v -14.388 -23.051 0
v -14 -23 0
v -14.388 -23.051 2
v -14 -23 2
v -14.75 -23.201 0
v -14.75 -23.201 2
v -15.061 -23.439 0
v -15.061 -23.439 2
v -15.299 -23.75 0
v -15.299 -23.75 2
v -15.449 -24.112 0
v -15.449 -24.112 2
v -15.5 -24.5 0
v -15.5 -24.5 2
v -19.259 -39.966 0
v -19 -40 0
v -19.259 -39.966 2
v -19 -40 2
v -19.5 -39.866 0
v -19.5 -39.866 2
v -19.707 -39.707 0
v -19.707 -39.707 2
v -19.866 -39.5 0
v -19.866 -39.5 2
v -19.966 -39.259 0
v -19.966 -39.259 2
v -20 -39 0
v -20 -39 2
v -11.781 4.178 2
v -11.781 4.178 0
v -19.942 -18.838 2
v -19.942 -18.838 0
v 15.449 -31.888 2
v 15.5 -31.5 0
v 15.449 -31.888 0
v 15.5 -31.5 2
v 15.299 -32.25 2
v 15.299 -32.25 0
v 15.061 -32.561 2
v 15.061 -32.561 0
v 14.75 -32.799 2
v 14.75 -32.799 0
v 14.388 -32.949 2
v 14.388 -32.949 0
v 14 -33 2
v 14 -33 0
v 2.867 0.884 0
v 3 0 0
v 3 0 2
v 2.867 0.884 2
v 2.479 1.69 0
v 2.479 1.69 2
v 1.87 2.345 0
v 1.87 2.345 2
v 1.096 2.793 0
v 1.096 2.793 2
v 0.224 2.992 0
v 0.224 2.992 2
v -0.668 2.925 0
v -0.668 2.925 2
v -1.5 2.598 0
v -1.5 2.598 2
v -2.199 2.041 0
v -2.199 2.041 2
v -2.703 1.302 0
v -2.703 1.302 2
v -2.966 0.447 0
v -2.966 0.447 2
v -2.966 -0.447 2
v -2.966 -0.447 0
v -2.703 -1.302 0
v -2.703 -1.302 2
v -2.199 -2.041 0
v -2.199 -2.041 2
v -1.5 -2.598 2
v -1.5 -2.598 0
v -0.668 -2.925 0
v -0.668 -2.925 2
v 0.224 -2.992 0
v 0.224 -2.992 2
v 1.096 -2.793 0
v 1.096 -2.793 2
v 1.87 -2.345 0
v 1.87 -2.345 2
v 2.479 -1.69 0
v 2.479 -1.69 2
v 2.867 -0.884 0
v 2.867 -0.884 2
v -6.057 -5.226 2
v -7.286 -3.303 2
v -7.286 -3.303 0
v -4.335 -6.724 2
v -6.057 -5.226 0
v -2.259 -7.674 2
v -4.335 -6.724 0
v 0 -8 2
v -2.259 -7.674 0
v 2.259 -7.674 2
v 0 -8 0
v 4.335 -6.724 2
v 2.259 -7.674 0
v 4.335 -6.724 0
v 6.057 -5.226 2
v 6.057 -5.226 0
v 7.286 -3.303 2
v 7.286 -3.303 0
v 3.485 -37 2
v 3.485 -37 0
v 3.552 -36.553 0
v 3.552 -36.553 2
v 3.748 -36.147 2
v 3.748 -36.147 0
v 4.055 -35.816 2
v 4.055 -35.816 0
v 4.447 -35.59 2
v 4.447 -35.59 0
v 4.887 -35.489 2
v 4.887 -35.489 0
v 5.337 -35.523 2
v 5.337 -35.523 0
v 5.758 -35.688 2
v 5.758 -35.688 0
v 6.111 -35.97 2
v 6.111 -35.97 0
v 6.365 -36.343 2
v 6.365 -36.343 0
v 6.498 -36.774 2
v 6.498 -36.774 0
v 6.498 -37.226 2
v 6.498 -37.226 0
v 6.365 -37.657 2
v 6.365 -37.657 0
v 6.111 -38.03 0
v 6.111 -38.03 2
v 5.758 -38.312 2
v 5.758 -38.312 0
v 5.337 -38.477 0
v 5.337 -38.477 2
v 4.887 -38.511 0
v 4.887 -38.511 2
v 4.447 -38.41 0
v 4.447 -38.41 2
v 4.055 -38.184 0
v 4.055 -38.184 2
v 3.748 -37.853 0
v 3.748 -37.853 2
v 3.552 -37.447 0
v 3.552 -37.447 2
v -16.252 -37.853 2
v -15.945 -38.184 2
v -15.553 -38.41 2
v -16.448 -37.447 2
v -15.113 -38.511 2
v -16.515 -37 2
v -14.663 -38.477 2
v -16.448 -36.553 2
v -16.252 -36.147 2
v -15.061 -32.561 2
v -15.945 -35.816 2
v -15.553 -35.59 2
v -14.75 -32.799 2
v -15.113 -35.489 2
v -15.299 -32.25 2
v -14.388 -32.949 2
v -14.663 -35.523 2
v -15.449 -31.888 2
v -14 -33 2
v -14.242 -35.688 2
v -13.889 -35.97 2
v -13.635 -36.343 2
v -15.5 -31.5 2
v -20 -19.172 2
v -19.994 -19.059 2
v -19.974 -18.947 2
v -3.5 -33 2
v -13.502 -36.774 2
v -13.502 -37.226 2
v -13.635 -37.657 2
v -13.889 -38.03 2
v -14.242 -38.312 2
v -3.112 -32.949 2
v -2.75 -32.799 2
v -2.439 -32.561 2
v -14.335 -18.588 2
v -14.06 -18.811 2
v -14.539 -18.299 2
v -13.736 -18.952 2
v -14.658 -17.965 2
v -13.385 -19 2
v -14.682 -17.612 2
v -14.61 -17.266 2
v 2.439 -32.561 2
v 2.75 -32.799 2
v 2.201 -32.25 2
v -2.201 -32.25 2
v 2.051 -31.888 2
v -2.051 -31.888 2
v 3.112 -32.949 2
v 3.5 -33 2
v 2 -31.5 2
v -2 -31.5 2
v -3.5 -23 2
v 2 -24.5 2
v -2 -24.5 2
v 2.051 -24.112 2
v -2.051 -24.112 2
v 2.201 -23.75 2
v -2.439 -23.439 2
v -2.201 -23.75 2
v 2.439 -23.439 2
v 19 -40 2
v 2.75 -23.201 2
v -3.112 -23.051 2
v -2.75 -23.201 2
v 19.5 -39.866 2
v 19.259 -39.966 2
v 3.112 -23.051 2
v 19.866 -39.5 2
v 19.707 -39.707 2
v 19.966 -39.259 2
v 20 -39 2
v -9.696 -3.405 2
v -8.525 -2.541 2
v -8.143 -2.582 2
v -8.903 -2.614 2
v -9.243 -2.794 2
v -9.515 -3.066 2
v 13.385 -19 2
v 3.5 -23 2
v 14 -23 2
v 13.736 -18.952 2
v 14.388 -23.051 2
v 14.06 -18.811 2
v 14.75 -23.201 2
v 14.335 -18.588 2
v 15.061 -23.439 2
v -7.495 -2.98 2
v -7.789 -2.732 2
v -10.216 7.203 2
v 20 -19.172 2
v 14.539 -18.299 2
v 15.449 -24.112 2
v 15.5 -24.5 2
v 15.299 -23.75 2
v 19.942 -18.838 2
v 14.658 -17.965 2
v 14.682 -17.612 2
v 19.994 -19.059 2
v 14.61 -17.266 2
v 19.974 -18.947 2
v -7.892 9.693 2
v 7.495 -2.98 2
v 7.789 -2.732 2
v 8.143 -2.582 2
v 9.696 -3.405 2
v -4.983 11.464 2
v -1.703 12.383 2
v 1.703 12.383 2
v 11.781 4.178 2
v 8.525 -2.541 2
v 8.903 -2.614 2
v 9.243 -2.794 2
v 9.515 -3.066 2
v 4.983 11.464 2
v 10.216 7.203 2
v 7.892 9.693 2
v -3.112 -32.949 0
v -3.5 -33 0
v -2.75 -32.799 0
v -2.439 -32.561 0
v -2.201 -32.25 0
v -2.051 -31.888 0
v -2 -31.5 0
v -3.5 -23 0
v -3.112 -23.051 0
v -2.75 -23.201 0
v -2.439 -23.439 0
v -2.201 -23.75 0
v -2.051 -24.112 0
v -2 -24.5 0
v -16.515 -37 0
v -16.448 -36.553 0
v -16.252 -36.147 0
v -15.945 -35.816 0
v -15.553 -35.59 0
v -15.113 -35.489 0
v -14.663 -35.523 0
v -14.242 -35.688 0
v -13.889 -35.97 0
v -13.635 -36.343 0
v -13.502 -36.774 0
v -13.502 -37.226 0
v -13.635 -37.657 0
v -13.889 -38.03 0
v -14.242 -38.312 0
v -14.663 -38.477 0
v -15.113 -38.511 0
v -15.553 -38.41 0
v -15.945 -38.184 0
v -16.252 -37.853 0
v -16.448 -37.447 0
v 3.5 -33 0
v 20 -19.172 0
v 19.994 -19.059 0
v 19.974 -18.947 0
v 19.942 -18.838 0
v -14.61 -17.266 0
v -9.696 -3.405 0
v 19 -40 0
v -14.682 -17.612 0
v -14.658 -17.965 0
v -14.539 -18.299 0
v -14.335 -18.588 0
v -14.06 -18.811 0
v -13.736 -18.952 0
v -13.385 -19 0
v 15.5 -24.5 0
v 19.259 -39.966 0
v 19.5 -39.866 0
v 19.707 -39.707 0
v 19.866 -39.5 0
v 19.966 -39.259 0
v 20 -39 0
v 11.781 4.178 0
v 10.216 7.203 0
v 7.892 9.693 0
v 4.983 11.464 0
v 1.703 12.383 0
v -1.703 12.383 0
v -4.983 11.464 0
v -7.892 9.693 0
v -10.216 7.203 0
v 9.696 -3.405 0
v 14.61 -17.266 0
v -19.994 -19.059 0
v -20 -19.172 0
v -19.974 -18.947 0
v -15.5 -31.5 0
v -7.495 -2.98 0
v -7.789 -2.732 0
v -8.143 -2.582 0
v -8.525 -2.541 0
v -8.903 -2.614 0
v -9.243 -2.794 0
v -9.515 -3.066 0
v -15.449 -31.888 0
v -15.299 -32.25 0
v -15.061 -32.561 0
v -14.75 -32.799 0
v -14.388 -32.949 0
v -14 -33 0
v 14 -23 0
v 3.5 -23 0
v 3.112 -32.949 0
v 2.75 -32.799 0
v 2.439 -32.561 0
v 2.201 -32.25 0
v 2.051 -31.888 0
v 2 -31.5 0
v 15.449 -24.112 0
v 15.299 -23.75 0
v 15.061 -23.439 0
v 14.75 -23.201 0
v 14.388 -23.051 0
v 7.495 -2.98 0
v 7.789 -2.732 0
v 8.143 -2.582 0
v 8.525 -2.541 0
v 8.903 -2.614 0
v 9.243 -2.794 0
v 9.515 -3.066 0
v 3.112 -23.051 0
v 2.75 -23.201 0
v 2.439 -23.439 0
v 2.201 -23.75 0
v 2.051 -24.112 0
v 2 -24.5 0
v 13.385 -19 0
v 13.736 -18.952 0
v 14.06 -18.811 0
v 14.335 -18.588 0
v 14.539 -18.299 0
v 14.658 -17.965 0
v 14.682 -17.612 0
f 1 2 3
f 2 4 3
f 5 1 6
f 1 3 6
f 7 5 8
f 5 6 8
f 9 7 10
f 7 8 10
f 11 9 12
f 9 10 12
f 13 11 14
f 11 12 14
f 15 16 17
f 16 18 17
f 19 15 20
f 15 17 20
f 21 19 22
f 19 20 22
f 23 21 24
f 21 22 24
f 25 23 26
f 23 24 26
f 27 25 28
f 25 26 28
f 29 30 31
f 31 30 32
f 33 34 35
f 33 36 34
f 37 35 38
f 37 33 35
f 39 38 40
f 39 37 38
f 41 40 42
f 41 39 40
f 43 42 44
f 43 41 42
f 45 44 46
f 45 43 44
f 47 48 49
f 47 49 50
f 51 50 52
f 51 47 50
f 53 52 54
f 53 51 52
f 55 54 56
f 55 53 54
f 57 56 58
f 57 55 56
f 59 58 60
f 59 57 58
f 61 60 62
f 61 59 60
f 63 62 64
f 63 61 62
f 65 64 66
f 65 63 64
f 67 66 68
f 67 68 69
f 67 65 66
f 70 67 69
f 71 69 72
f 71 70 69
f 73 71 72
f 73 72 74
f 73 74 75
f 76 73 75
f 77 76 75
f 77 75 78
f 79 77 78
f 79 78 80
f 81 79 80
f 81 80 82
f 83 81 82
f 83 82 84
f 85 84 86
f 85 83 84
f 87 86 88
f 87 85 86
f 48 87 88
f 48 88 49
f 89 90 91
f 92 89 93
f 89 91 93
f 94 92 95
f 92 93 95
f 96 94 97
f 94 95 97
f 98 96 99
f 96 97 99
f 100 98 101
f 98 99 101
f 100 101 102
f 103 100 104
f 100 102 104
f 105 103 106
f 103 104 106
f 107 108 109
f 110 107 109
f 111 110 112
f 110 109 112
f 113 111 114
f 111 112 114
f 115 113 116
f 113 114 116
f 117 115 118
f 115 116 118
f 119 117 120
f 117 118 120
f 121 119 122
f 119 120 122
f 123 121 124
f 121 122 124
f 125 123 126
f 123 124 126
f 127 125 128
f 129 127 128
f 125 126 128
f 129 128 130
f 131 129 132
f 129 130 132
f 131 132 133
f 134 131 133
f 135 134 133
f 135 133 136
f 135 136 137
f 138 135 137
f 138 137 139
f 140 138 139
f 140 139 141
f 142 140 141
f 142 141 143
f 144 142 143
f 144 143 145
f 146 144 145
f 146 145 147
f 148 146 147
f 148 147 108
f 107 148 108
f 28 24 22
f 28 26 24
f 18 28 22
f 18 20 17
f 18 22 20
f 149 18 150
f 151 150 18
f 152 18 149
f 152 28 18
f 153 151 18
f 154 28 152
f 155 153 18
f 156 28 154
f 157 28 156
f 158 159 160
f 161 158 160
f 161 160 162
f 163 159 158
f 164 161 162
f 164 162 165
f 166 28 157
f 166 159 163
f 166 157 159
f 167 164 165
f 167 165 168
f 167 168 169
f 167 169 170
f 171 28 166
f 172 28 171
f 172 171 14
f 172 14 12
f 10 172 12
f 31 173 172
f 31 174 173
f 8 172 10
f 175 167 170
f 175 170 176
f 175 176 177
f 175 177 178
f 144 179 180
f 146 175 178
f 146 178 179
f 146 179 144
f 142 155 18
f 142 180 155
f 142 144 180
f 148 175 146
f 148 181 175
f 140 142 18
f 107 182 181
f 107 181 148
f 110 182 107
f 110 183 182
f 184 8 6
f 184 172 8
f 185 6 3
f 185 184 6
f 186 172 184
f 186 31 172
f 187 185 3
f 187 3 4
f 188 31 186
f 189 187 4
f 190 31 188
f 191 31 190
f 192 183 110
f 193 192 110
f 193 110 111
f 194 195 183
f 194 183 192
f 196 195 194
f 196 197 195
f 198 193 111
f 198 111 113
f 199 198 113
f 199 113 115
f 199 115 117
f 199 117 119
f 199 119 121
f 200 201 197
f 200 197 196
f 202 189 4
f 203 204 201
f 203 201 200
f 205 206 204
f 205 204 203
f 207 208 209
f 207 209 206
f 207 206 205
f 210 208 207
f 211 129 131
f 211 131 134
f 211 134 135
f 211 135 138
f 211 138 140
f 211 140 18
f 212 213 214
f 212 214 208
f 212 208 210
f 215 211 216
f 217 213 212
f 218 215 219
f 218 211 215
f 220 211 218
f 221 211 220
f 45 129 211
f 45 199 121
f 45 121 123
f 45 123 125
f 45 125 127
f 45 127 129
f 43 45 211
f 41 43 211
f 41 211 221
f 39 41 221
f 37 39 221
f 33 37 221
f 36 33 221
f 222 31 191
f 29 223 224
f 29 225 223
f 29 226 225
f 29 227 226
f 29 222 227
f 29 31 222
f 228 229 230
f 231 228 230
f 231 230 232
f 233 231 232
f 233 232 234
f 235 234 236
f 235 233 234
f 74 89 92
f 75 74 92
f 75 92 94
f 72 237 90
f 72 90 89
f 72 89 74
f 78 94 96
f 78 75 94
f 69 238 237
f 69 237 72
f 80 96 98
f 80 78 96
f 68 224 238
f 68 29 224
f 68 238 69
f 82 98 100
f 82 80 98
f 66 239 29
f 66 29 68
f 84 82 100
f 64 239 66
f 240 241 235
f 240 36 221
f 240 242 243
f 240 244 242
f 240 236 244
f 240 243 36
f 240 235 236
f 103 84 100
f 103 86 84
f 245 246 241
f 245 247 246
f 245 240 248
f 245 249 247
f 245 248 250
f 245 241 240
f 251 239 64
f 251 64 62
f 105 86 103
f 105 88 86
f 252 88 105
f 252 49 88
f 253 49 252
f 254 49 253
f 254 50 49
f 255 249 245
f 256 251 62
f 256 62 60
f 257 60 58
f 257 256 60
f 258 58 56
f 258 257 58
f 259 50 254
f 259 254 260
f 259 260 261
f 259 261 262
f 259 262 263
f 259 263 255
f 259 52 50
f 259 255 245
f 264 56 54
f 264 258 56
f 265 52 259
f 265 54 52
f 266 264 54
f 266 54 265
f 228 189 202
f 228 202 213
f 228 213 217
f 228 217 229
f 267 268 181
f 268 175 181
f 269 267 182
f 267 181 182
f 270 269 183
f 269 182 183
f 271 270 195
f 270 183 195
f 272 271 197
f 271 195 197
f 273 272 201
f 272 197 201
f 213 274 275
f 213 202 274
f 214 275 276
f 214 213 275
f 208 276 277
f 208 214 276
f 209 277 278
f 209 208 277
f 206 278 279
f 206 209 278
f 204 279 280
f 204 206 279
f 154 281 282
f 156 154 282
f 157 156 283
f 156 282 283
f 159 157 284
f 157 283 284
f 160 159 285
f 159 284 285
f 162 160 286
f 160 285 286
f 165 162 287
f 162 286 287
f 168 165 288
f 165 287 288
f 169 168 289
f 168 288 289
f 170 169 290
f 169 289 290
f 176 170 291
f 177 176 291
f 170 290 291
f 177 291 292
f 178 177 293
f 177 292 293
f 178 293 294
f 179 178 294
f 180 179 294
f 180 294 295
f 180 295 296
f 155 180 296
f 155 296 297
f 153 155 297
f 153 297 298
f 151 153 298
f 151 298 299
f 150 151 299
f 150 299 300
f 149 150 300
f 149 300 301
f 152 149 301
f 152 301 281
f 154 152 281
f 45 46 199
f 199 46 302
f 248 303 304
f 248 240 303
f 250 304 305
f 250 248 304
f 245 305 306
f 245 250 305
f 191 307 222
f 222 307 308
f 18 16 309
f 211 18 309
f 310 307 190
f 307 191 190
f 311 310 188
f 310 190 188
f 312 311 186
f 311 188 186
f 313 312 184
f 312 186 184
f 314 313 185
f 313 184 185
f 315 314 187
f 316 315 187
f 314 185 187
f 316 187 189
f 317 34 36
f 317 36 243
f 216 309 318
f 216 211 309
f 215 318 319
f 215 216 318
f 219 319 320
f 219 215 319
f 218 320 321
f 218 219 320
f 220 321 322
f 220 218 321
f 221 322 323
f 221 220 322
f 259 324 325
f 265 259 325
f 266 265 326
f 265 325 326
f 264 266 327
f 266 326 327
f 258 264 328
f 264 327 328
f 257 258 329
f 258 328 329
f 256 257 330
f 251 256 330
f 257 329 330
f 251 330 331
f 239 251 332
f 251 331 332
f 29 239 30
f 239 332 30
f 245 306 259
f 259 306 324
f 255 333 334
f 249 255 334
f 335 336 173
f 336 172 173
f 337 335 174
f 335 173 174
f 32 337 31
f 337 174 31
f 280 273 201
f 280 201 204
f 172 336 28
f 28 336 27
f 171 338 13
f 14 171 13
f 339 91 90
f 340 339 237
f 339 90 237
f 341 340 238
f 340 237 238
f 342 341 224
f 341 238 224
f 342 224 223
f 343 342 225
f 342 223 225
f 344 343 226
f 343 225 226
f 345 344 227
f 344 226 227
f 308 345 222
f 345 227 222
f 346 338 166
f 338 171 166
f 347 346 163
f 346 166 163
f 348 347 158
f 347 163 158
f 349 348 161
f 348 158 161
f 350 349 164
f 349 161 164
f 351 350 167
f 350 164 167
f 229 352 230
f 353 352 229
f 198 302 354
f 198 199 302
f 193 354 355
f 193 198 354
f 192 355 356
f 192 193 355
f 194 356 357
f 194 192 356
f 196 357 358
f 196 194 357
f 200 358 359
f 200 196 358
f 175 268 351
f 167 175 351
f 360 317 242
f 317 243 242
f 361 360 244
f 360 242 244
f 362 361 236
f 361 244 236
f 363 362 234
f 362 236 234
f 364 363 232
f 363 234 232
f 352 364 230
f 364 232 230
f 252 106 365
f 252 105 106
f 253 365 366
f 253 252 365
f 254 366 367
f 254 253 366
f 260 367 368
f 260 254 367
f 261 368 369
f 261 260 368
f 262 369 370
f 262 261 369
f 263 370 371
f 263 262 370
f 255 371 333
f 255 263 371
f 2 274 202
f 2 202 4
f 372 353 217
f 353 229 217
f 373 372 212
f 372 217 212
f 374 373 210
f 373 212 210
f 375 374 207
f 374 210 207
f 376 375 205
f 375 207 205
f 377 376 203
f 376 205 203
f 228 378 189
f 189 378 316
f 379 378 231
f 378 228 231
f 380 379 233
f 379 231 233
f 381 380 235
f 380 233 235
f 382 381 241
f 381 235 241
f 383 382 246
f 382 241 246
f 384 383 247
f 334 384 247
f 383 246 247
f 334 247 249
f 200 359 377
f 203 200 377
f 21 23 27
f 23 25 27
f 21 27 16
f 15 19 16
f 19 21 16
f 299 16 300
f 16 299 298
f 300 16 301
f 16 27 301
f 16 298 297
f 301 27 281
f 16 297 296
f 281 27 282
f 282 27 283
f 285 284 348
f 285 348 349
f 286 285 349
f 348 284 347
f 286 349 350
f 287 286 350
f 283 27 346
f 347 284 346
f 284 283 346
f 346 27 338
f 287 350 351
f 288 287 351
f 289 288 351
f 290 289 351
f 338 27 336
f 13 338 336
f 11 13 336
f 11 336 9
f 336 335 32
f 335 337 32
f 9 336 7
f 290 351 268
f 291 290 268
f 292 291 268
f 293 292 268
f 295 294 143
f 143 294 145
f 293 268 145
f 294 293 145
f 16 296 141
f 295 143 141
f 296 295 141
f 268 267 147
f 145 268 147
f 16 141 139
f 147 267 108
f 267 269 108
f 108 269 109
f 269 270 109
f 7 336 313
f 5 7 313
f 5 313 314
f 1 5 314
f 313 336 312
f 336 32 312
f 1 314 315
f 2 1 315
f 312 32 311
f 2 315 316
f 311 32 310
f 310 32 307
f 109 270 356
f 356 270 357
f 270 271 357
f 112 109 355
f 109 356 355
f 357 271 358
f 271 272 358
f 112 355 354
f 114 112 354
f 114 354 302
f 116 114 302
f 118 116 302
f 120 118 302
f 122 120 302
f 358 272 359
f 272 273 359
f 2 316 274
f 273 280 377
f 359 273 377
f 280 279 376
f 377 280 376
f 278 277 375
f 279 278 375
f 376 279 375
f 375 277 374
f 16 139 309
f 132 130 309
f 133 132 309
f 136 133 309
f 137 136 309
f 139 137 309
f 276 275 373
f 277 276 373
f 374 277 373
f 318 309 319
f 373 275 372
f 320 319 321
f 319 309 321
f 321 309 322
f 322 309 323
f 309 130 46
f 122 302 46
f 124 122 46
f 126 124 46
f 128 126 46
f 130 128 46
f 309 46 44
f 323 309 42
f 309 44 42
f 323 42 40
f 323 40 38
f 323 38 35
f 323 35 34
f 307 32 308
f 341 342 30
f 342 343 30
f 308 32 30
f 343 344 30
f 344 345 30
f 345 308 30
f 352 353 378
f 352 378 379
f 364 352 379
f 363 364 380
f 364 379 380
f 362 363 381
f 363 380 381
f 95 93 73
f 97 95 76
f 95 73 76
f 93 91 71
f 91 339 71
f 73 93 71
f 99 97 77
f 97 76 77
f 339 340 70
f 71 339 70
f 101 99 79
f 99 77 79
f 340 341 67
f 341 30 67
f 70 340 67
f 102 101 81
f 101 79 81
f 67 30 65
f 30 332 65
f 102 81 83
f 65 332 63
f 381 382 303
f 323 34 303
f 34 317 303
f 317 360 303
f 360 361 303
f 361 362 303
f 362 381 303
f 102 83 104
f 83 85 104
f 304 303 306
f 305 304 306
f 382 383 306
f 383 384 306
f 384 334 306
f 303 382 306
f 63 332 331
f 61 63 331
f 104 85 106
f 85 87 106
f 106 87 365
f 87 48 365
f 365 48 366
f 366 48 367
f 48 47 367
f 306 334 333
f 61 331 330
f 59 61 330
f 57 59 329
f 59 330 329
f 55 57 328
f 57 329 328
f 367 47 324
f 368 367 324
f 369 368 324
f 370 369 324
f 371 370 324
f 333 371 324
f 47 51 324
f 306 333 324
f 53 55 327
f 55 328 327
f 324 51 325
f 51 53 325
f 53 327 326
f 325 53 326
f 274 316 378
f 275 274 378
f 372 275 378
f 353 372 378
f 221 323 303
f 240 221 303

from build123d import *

# Parameters (mm, degrees)
SKETCH_1_R          = 3
EXTRUDE_1_DEPTH     = 2
FILLET_1_R          = 1
SKETCH_2_R          = 1.515
CUT_EXTRUDE_1_DEPTH = 10
CUT_EXTRUDE_2_DEPTH = 10
FILLET_2_R          = 1.3
SKETCH_4_W          = 31
SKETCH_4_H          = 10
CUT_EXTRUDE_3_DEPTH = 10
SKETCH_5_W          = 4
SKETCH_5_H          = 10
EXTRUDE_1_2_DEPTH   = 2
FILLET_4_R          = 1.5


with BuildPart() as part:
    # 草图1 → Extrude 1 (new body)
    with BuildSketch(Plane.XY):
        with BuildLine():
            Line((-20, -40), (20, -40))
            Line((20, -40), (20, -19))
            Line((20, -19), (11.781235871, 4.177616707))
            ThreePointArc((11.781235871, 4.177616707), (0, 12.5), (-11.781235871, 4.177616707))
            Line((-11.781235871, 4.177616707), (-20, -19))
            Line((-20, -19), (-20, -40))
        make_face()
        Circle(SKETCH_1_R, mode=Mode.SUBTRACT)
    extrude(amount=EXTRUDE_1_DEPTH)

    # 圆角1
    fillet_1_edges = [part.edges().sort_by_distance(p)[0] for p in [
        (20, -19, 1),
        (20, -40, 1),
        (-20, -40, 1),
        (-20, -19, 1),
    ]]
    fillet(fillet_1_edges, radius=FILLET_1_R)

    # 草图2 → 切除-拉伸1 (cut)
    with BuildSketch(Plane(origin=(0, 0, 0), x_dir=(-1, 0, 0), z_dir=(0, 0, -1))):
        with Locations((15, -37)):
            Circle(SKETCH_2_R)
        with Locations((-5, -37)):
            Circle(SKETCH_2_R)
    extrude(amount=-CUT_EXTRUDE_1_DEPTH, mode=Mode.SUBTRACT)

    # 草图3 → 切除-拉伸2 (cut)
    with BuildSketch(Plane(origin=(0, 0, 0), x_dir=(-1, 0, 0), z_dir=(0, 0, -1))):
        with BuildLine():
            Line((-7.539990958, 2.673674692), (-15.225458465, -19))
            Line((-15.225458465, -19), (15.225458465, -19))
            Line((15.225458465, -19), (7.539990958, 2.673674692))
            ThreePointArc((7.539990958, 2.673674692), (0, -8), (-7.539990958, 2.673674692))
        make_face()
    extrude(amount=-CUT_EXTRUDE_2_DEPTH, mode=Mode.SUBTRACT)

    # 圆角2
    fillet_2_edges = [part.edges().sort_by_distance(p)[0] for p in [
        (7.539990958, 2.673674692, 1),
        (-7.539990958, 2.673674692, 1),
        (-15.225458465, -19, 1),
        (15.225458465, -19, 1),
    ]]
    fillet(fillet_2_edges, radius=FILLET_2_R)

    # 草图4 → 切除-拉伸3 (cut)
    with BuildSketch(Plane(origin=(0, 0, 0), x_dir=(-1, 0, 0), z_dir=(0, 0, -1))):
        with Locations((0, -28)):
            Rectangle(SKETCH_4_W, SKETCH_4_H)
    extrude(amount=-CUT_EXTRUDE_3_DEPTH, mode=Mode.SUBTRACT)

    # 草图5 → Extrude 1 2 (add)
    with BuildSketch(Plane(origin=(0, 0, 0), x_dir=(-1, 0, 0), z_dir=(0, 0, -1))):
        with Locations((0, -28)):
            Rectangle(SKETCH_5_W, SKETCH_5_H)
    extrude(amount=-EXTRUDE_1_2_DEPTH)

    # 圆角4
    fillet_4_edges = [part.edges().sort_by_distance(p)[0] for p in [
        (15.5, -33, 1),
        (15.5, -23, 1),
        (-15.5, -23, 1),
        (-15.5, -33, 1),
        (2, -33, 1),
        (2, -23, 1),
        (-2, -23, 1),
        (-2, -33, 1),
    ]]
    fillet(fillet_4_edges, radius=FILLET_4_R)


solid = part.part
